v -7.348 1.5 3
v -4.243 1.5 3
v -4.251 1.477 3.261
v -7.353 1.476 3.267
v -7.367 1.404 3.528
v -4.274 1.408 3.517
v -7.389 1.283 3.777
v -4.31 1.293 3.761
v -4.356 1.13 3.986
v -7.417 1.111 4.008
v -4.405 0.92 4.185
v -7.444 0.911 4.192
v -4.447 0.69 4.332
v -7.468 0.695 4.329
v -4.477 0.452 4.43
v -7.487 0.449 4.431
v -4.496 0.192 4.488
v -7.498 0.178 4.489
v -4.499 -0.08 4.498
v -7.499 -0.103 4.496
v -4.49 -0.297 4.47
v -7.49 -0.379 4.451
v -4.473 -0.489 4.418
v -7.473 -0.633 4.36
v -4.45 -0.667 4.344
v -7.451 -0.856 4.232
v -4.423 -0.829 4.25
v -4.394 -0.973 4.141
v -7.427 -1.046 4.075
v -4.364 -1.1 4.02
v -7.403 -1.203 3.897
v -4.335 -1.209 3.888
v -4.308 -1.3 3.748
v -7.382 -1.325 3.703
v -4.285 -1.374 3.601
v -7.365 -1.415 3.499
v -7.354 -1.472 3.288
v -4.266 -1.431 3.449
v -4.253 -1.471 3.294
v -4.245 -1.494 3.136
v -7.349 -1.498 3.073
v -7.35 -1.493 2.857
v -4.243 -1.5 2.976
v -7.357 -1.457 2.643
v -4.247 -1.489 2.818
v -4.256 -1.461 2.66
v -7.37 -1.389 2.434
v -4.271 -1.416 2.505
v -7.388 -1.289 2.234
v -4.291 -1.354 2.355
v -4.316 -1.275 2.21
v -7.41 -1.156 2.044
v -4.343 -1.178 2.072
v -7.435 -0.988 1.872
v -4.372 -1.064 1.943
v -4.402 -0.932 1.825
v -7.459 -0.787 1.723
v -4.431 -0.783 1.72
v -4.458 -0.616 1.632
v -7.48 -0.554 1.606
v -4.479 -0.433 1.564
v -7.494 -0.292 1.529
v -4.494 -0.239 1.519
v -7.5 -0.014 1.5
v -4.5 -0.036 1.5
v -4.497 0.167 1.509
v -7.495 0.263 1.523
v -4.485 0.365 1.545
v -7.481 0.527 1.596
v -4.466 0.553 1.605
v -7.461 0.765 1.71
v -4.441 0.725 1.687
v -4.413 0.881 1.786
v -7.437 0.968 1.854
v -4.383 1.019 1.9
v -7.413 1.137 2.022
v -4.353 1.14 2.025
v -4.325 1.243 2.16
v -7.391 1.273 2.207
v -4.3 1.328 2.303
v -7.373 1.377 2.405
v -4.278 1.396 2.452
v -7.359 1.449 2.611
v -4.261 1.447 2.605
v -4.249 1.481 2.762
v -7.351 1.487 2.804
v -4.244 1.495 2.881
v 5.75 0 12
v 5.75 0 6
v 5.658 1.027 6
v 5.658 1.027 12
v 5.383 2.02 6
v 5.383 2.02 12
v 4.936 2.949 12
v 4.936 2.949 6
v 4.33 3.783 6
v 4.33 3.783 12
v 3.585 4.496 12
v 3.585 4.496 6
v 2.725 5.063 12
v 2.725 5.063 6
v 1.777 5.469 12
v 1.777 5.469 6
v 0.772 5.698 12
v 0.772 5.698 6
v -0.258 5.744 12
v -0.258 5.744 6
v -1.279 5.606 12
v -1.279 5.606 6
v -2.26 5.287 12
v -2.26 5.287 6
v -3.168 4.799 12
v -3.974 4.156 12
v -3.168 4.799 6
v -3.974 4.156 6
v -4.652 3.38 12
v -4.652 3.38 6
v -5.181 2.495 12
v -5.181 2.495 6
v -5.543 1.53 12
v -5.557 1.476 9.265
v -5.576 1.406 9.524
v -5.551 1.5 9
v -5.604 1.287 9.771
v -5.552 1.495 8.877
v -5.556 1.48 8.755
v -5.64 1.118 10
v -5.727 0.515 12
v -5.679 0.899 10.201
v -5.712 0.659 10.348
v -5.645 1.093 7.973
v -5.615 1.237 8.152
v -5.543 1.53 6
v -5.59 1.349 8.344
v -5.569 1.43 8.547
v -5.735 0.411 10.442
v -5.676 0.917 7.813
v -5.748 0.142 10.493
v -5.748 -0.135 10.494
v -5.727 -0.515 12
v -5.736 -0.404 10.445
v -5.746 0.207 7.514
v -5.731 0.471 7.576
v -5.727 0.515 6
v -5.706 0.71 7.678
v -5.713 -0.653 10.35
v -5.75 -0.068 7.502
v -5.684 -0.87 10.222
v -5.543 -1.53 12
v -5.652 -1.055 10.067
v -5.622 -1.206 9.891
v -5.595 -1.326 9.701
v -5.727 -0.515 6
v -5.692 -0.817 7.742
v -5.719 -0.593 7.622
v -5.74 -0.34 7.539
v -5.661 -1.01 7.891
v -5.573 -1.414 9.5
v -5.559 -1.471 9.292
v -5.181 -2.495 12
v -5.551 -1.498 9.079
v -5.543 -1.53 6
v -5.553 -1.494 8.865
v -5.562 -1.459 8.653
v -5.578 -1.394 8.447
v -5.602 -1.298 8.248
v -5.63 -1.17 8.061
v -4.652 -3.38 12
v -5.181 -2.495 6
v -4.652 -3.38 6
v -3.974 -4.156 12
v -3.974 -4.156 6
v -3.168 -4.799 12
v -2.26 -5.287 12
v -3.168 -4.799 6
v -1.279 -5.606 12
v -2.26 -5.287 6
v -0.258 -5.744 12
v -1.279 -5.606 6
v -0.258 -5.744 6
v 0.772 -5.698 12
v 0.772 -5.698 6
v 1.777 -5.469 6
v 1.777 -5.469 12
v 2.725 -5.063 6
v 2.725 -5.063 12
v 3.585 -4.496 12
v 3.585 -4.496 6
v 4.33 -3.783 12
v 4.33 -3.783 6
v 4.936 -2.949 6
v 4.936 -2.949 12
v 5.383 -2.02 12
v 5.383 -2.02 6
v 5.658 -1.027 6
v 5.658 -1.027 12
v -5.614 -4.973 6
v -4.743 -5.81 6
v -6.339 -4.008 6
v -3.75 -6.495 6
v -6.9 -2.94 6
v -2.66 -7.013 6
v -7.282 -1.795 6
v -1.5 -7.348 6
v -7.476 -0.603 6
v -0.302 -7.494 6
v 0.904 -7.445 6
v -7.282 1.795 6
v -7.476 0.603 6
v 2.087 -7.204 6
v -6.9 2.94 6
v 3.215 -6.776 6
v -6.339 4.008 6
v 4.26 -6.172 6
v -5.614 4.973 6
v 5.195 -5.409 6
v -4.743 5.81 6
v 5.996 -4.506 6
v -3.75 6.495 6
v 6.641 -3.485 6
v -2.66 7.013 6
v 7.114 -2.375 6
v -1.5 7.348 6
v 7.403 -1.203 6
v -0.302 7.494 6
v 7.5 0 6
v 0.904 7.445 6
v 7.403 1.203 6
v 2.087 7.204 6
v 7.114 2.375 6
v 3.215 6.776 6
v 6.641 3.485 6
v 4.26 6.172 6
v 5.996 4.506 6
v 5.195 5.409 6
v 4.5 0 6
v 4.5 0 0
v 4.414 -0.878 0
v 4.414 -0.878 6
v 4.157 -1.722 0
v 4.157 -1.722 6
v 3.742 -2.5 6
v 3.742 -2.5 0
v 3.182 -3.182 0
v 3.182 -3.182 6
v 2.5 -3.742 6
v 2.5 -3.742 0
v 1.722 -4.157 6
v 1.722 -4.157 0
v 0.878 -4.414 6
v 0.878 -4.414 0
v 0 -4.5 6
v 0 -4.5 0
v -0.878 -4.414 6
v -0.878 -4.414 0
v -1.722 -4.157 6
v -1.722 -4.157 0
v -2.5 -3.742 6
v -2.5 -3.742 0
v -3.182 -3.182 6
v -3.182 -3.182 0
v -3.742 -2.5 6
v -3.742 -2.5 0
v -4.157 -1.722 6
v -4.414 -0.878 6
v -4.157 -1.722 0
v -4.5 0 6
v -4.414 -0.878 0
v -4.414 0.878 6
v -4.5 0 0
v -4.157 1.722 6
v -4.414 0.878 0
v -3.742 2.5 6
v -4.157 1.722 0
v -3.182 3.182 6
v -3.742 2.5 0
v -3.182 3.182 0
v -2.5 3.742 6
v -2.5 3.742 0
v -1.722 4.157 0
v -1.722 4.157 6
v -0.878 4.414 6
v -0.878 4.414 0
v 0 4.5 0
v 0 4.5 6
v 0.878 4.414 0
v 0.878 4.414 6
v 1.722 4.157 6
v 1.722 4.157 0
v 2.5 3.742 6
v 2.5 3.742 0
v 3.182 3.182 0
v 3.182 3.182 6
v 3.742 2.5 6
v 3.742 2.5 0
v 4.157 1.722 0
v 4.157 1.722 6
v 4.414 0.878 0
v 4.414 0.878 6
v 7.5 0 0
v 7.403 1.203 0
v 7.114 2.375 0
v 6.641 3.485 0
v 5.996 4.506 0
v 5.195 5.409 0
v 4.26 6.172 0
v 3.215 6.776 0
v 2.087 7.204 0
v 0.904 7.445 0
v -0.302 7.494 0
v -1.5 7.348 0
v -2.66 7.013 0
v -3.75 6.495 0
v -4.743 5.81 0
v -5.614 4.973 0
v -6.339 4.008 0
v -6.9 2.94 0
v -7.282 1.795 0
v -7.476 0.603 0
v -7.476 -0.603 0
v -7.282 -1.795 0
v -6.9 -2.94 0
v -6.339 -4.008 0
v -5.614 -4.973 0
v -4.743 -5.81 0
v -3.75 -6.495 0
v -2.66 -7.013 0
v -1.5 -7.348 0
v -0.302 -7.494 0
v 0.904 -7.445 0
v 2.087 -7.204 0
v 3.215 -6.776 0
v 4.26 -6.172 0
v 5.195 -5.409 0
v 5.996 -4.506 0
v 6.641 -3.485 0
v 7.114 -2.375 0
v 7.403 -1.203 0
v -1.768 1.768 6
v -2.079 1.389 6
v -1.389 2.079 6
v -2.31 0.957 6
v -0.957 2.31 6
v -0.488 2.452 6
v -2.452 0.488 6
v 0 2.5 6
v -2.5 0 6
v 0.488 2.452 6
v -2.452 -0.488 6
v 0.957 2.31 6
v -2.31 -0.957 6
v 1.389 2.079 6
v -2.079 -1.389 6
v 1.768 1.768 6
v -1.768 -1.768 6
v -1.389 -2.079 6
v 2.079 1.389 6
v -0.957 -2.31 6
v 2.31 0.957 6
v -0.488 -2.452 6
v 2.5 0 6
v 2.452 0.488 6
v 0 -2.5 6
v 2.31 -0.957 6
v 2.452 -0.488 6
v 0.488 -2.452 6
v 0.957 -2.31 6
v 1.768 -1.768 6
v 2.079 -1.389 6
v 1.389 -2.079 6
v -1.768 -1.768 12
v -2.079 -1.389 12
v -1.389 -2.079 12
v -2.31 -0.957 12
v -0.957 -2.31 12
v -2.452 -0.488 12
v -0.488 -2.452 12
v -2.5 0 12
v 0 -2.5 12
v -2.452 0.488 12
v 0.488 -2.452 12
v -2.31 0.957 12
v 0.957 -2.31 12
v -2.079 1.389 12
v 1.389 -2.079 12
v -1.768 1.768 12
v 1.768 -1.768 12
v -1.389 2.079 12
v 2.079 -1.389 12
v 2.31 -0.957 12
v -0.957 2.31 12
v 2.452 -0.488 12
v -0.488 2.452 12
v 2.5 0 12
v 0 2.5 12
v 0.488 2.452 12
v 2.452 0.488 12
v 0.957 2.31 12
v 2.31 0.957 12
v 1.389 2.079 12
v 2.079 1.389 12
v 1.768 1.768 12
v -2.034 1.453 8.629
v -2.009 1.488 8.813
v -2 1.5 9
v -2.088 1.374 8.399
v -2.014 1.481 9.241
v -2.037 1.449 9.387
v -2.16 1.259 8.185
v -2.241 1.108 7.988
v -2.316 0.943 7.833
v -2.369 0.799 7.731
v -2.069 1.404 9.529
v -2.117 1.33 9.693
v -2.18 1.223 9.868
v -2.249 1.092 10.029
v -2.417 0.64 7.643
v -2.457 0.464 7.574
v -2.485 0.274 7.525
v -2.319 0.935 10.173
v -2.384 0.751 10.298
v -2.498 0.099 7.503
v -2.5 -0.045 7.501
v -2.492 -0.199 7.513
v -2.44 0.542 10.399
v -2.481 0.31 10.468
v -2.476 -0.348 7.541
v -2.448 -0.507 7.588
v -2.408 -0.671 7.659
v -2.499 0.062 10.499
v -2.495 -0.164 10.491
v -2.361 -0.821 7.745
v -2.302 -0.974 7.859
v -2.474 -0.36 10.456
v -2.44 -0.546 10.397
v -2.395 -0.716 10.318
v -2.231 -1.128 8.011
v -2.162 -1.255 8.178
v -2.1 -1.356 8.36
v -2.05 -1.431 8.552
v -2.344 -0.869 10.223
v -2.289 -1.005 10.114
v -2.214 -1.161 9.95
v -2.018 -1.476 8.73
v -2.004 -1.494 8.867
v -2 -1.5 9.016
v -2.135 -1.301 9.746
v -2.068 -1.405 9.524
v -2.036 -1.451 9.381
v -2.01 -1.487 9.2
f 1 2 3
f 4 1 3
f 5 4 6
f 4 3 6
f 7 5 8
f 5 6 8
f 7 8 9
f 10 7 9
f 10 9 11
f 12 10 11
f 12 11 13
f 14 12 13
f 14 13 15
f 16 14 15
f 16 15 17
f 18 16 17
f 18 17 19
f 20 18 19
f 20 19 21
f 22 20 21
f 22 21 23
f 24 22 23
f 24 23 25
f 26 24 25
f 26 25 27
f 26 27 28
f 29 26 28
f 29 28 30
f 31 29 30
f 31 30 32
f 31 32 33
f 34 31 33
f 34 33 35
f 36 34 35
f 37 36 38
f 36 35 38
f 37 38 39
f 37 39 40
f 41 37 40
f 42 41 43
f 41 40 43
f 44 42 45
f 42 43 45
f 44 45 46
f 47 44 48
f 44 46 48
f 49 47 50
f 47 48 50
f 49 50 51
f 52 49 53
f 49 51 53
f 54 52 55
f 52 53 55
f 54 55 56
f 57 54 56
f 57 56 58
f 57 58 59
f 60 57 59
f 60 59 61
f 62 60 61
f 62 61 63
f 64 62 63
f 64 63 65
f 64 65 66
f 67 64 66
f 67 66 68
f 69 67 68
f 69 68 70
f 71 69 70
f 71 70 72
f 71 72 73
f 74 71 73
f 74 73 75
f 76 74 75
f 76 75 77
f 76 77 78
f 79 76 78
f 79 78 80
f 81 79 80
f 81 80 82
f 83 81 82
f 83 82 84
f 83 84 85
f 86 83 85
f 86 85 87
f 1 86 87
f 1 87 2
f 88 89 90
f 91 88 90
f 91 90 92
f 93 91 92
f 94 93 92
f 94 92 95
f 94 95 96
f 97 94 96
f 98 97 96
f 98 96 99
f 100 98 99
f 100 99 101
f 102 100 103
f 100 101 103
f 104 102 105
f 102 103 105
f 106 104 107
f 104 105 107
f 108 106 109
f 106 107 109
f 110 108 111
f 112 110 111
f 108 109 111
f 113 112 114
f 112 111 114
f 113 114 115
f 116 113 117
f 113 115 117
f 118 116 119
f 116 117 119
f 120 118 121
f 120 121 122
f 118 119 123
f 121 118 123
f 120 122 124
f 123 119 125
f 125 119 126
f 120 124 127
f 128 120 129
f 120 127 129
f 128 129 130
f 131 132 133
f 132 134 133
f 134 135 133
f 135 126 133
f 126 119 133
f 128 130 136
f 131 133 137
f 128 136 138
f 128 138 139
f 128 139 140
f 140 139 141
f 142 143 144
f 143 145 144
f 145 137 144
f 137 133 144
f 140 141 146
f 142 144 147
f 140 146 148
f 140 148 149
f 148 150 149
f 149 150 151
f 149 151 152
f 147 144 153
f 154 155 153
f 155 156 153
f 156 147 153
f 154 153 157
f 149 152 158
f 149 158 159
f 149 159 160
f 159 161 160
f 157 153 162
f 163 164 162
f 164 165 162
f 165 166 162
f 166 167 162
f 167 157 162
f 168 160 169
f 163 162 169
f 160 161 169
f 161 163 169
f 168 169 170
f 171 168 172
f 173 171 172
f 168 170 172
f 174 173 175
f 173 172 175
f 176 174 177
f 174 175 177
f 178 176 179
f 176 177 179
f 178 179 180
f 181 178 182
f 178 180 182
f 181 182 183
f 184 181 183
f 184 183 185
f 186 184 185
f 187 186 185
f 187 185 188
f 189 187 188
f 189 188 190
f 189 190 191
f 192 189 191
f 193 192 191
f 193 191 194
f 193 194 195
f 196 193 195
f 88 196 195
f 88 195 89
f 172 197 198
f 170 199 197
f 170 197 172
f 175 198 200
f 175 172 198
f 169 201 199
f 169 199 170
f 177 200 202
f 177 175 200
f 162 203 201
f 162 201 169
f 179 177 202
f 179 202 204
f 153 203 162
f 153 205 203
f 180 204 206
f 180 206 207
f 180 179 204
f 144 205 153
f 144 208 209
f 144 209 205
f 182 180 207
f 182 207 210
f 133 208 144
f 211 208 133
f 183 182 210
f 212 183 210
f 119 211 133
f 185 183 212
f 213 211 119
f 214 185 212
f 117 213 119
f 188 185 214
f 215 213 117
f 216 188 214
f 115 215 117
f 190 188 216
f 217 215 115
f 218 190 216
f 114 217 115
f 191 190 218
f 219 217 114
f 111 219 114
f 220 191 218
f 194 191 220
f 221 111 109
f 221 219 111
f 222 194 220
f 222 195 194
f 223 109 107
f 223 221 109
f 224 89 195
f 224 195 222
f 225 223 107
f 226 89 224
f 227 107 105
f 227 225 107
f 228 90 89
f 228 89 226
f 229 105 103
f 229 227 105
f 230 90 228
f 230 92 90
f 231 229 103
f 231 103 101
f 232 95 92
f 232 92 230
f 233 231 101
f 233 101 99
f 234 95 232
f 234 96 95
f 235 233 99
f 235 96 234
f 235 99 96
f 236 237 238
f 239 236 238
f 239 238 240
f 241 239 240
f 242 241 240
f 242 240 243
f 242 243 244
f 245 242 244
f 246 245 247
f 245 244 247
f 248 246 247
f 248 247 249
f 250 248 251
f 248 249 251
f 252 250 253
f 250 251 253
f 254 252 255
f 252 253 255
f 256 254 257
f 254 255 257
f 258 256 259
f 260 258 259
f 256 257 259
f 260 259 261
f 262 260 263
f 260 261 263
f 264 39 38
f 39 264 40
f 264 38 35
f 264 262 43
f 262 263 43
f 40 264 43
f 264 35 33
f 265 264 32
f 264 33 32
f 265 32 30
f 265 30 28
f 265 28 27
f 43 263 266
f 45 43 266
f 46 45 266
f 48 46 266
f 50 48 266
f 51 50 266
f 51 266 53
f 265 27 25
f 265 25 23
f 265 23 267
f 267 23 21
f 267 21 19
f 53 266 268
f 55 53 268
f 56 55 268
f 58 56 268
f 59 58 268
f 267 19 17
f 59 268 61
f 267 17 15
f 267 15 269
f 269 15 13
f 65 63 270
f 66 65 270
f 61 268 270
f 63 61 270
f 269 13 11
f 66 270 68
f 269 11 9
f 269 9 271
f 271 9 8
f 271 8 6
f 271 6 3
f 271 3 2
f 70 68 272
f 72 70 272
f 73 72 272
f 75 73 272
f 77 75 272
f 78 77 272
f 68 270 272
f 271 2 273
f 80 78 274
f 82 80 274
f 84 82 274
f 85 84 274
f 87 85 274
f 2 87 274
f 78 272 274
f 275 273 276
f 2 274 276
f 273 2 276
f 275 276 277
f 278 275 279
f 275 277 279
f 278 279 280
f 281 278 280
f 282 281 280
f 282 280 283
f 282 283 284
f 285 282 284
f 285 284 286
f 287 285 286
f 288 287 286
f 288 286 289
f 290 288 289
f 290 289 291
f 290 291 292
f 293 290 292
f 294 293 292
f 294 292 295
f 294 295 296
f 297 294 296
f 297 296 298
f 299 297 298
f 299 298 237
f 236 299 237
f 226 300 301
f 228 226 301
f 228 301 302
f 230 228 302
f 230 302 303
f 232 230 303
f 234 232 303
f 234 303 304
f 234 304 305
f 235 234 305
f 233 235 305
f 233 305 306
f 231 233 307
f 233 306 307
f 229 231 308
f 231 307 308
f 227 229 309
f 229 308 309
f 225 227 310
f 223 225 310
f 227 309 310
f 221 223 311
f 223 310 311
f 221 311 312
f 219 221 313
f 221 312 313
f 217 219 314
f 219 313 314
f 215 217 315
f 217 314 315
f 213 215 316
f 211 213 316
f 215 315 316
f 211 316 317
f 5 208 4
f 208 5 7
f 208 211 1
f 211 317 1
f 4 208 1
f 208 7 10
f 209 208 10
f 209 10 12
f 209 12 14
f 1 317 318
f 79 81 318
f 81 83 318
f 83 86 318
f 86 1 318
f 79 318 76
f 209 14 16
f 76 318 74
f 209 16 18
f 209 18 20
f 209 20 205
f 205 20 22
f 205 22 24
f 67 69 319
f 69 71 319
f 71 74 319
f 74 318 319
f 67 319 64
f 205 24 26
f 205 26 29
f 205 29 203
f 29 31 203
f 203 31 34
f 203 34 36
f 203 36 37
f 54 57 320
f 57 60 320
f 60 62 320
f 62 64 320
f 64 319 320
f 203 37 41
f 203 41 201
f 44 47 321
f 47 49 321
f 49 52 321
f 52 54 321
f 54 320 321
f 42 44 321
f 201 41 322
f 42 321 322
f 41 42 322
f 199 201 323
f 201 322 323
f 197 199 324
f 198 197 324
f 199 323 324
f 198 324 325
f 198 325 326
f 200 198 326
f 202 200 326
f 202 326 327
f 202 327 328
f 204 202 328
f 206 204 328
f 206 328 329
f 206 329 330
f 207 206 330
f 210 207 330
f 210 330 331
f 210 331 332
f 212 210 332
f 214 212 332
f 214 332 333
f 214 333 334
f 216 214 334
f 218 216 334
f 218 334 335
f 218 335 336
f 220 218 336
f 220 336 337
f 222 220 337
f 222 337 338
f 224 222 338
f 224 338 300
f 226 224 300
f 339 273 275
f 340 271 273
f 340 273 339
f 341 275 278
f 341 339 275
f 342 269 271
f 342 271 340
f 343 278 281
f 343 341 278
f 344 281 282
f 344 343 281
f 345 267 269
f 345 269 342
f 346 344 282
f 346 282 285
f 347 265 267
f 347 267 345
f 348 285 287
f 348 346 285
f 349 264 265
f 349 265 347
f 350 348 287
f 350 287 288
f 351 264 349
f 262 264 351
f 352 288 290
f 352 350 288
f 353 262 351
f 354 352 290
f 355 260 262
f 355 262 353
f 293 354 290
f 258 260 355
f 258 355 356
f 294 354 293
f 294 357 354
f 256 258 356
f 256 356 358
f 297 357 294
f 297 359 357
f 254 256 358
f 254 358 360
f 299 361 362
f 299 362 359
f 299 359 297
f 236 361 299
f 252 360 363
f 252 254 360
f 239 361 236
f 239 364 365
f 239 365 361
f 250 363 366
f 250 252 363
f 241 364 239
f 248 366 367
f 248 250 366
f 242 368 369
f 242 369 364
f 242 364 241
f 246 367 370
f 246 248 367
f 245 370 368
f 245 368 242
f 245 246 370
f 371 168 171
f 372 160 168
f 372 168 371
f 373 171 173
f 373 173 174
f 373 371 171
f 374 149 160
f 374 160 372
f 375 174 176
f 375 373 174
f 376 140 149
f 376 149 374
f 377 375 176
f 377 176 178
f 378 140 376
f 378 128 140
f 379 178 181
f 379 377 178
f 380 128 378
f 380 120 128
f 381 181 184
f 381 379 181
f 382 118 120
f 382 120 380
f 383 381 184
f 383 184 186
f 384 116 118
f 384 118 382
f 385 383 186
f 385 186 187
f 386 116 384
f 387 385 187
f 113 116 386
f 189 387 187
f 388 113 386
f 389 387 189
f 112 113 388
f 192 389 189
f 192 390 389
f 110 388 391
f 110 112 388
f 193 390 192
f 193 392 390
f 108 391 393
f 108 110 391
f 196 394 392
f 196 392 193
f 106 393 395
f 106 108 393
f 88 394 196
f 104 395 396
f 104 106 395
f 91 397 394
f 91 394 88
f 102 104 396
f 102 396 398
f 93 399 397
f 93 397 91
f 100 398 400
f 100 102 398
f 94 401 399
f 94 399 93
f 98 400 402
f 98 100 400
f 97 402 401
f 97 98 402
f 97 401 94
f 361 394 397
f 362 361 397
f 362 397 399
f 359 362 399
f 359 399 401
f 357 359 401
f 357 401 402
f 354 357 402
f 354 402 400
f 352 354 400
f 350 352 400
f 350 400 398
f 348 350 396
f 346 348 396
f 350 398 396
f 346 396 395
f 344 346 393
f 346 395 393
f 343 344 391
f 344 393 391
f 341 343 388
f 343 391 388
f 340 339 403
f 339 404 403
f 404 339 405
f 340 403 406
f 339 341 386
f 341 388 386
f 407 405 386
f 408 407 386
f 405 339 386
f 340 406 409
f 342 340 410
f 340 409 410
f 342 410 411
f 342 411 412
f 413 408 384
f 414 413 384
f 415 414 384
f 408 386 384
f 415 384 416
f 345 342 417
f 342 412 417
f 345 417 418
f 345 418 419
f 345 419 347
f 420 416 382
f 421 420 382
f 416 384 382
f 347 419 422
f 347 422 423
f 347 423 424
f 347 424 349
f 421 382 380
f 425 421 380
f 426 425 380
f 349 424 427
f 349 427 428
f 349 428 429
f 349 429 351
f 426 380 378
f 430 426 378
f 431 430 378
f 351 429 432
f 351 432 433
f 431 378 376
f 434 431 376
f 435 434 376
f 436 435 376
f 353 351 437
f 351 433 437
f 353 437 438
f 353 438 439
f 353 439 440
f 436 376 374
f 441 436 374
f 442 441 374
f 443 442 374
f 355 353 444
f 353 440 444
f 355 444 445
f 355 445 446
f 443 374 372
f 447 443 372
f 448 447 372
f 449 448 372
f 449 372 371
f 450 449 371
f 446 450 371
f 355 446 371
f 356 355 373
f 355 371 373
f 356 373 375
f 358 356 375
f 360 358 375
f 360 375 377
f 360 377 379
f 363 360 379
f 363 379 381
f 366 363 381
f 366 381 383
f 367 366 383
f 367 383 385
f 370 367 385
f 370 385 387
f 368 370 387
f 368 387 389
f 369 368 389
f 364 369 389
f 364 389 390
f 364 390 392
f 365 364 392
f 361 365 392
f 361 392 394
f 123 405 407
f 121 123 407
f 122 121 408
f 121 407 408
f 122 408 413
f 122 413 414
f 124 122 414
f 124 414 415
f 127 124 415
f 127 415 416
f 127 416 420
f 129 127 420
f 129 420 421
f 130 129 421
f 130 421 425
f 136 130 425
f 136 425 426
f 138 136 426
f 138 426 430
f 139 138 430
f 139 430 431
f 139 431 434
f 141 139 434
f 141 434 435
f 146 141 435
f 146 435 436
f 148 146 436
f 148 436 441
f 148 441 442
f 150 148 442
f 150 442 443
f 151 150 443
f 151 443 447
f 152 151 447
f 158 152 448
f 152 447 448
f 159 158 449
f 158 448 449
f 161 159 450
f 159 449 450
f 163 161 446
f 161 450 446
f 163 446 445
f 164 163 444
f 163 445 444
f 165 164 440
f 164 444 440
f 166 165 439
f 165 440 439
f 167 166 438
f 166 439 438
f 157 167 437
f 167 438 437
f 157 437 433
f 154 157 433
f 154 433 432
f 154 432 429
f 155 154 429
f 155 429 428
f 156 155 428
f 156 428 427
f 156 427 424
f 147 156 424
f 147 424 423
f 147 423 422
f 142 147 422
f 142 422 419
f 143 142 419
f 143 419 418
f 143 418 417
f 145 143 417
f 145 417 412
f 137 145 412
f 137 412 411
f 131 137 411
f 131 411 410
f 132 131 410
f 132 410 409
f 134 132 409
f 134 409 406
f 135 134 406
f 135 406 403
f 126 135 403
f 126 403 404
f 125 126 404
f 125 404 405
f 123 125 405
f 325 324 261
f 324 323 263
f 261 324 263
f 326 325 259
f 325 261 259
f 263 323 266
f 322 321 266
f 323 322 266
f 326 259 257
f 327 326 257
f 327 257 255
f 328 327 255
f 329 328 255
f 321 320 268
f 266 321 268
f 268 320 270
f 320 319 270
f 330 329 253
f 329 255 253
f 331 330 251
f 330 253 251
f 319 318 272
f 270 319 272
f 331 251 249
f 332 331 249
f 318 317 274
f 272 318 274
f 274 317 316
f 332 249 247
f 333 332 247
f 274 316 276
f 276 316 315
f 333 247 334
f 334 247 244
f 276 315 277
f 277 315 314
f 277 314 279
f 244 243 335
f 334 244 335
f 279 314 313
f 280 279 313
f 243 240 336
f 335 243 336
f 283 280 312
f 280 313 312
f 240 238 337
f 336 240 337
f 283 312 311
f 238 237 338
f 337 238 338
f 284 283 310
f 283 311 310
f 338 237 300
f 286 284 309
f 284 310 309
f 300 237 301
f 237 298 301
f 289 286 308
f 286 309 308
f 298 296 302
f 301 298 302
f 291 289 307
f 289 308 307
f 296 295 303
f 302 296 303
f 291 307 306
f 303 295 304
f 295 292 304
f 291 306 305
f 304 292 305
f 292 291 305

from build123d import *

# Parameters (mm, degrees)
F0_R     = 7.5
F1_DEPTH = 6
F2_R     = 5.75
F3_DEPTH = 6
F4_R     = 2.5
F5_DEPTH = 6
F6_R     = 4.5
F7_DEPTH = 6
F8_R     = 1.5
F9_DEPTH = 25


with BuildPart() as f1:
    # F0 (on Top) → F1 (new body)
    with BuildSketch(Plane.XY):
        Circle(F0_R)
    extrude(amount=F1_DEPTH)

    # F2 (on face) → F3 (join)
    with BuildSketch(Plane.XY.offset(6)):
        Circle(F2_R)
    extrude(amount=F3_DEPTH)

    # F4 (on face) → F5 (cut)
    with BuildSketch(Plane.XY.offset(12)):
        Circle(F4_R)
    extrude(amount=-F5_DEPTH, mode=Mode.SUBTRACT)

    # F6 (on face) → F7 (cut)
    with BuildSketch(Plane(origin=(0, 0, 0), x_dir=(1, 0, 0), z_dir=(0, 0, -1))):
        Circle(F6_R)
    extrude(amount=-F7_DEPTH, mode=Mode.SUBTRACT)

    # F8 (on Right) → F9 (cut)
    with BuildSketch(Plane.YZ):
        with Locations((0, 3)):
            Circle(F8_R)
        with Locations((0, 9)):
            Circle(F8_R)
    extrude(amount=-F9_DEPTH, mode=Mode.SUBTRACT)


solid = f1.part
